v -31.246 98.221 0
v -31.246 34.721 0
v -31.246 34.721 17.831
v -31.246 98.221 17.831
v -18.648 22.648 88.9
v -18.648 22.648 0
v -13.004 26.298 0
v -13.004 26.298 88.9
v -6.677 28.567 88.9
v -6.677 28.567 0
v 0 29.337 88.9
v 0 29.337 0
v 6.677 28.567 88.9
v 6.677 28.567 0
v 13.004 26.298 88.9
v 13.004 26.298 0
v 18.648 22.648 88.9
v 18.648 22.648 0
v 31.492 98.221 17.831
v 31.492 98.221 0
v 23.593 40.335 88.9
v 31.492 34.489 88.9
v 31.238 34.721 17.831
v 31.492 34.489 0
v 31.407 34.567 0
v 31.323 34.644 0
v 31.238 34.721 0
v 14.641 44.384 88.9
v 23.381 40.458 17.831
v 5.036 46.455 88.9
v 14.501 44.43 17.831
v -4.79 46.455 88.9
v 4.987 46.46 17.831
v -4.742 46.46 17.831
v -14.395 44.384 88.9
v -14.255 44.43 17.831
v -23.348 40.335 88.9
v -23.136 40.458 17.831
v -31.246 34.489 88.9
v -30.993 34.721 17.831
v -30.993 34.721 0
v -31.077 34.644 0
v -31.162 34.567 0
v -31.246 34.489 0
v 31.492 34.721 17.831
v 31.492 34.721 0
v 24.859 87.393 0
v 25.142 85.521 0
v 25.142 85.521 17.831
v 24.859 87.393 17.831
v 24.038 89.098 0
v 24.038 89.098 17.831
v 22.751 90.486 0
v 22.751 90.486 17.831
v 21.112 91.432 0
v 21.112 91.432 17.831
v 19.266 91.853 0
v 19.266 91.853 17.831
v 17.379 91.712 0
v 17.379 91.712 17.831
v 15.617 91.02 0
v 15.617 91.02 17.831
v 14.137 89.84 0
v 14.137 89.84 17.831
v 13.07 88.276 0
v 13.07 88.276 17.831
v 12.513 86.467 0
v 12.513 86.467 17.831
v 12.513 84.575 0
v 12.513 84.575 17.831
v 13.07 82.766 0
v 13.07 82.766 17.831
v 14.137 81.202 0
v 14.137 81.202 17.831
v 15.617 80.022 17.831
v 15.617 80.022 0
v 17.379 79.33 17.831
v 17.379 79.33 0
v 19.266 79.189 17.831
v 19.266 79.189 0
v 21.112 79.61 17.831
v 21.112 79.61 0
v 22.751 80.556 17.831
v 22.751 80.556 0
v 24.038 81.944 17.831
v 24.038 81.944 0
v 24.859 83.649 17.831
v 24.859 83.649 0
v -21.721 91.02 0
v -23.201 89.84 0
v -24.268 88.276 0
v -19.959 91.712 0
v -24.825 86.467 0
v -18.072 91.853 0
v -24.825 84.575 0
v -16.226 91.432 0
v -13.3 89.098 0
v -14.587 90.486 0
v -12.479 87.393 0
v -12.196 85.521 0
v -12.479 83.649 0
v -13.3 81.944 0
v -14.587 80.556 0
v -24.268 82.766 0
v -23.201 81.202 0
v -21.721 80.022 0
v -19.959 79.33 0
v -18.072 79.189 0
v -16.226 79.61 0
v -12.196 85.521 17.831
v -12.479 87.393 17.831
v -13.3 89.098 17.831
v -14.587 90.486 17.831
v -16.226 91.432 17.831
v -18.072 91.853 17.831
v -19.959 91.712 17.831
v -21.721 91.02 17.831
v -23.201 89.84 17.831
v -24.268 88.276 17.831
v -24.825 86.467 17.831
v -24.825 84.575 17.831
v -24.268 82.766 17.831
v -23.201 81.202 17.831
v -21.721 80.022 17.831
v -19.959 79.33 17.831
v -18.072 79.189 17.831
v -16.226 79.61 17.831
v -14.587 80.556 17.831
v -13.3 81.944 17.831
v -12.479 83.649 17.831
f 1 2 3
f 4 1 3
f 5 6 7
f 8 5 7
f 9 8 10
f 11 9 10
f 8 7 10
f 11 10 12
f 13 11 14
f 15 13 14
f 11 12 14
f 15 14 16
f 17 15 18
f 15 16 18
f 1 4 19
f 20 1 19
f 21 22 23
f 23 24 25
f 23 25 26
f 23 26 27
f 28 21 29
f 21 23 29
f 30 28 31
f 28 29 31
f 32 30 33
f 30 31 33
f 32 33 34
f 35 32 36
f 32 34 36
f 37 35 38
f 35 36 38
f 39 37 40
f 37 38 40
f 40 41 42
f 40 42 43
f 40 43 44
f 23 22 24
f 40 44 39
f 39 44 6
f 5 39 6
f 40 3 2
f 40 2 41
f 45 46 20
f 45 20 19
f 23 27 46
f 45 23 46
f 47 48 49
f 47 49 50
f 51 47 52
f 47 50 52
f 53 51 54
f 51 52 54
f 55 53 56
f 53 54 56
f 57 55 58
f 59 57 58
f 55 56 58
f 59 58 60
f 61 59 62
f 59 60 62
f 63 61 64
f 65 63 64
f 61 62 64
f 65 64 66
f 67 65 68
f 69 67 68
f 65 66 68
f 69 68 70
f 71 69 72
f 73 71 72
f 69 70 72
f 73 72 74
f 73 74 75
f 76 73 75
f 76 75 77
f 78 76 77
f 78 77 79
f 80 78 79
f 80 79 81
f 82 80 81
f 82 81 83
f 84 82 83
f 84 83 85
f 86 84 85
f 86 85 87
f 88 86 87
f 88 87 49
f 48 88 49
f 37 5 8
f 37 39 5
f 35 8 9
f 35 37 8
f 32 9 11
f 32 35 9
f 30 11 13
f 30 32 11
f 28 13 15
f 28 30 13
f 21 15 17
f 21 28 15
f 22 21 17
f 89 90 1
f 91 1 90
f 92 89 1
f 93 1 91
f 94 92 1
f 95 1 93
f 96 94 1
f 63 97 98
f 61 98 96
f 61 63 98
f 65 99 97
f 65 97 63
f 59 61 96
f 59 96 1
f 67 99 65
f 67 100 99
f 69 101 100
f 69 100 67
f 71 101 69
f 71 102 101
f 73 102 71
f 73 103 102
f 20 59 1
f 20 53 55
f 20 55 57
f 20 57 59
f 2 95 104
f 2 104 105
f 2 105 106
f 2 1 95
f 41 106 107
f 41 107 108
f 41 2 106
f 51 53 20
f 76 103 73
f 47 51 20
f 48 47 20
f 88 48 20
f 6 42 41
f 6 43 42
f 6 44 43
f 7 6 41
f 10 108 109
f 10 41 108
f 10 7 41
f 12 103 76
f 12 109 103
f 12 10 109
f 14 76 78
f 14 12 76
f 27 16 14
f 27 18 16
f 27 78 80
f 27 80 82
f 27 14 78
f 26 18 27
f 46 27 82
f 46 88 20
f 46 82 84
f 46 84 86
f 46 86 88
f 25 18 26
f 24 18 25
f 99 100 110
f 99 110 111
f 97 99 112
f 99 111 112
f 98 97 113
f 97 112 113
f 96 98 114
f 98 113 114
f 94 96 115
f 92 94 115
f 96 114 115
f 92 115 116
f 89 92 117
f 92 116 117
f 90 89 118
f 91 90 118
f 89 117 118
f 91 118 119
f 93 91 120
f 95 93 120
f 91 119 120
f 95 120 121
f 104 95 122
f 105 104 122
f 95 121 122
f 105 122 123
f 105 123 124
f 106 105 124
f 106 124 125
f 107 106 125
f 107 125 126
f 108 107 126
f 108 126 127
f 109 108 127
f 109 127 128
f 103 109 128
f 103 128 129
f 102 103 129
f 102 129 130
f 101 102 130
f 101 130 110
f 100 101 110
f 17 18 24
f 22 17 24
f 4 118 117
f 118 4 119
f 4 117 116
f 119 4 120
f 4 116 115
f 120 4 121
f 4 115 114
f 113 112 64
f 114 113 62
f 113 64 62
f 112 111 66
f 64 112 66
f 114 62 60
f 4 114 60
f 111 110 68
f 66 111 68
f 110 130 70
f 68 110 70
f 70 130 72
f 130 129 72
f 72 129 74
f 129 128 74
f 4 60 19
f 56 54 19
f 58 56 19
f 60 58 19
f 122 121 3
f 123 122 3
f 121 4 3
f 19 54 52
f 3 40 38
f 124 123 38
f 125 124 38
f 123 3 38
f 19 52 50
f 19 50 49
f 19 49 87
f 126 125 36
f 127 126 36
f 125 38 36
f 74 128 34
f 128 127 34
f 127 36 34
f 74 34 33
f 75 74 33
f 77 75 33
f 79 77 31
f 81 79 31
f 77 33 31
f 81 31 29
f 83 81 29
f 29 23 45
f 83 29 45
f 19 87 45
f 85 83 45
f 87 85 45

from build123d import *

# Parameters (mm, degrees)
F1_DEPTH = 88.9
F3_W     = 62.738
F3_H     = 17.8308
F4_DEPTH = 63.5
F5_R     = 6.35
F6_DEPTH = 25.4


with BuildPart() as f1:
    # F0 (on Top) → F1 (new body)
    with BuildSketch(Plane.XY):
        with BuildLine():
            ThreePointArc((-18.647595, 22.647887), (0, 29.337), (18.647595, 22.647887))
            Line((18.647595, 22.647887), (31.4916, 34.48949))
            ThreePointArc((31.4916, 34.48949), (0.1226, 46.715736), (-31.2464, 34.48949))
            Line((-31.2464, 34.48949), (-18.647595, 22.647887))
        make_face()
    extrude(amount=F1_DEPTH)

    # F3 (on offset) → F4 (join)
    with BuildSketch(Plane.XZ.offset(-34.721038)):
        with Locations((0.1226, 8.9154)):
            Rectangle(F3_W, F3_H)
    extrude(amount=-F4_DEPTH)

    # F5 (on face) → F6 (cut)
    with BuildSketch(Plane.XY.offset(17.8308)):
        with Locations((18.7916, 85.521038)):
            Circle(F5_R)
        with Locations((-18.5464, 85.521038)):
            Circle(F5_R)
    extrude(amount=-F6_DEPTH, mode=Mode.SUBTRACT)


solid = f1.part
